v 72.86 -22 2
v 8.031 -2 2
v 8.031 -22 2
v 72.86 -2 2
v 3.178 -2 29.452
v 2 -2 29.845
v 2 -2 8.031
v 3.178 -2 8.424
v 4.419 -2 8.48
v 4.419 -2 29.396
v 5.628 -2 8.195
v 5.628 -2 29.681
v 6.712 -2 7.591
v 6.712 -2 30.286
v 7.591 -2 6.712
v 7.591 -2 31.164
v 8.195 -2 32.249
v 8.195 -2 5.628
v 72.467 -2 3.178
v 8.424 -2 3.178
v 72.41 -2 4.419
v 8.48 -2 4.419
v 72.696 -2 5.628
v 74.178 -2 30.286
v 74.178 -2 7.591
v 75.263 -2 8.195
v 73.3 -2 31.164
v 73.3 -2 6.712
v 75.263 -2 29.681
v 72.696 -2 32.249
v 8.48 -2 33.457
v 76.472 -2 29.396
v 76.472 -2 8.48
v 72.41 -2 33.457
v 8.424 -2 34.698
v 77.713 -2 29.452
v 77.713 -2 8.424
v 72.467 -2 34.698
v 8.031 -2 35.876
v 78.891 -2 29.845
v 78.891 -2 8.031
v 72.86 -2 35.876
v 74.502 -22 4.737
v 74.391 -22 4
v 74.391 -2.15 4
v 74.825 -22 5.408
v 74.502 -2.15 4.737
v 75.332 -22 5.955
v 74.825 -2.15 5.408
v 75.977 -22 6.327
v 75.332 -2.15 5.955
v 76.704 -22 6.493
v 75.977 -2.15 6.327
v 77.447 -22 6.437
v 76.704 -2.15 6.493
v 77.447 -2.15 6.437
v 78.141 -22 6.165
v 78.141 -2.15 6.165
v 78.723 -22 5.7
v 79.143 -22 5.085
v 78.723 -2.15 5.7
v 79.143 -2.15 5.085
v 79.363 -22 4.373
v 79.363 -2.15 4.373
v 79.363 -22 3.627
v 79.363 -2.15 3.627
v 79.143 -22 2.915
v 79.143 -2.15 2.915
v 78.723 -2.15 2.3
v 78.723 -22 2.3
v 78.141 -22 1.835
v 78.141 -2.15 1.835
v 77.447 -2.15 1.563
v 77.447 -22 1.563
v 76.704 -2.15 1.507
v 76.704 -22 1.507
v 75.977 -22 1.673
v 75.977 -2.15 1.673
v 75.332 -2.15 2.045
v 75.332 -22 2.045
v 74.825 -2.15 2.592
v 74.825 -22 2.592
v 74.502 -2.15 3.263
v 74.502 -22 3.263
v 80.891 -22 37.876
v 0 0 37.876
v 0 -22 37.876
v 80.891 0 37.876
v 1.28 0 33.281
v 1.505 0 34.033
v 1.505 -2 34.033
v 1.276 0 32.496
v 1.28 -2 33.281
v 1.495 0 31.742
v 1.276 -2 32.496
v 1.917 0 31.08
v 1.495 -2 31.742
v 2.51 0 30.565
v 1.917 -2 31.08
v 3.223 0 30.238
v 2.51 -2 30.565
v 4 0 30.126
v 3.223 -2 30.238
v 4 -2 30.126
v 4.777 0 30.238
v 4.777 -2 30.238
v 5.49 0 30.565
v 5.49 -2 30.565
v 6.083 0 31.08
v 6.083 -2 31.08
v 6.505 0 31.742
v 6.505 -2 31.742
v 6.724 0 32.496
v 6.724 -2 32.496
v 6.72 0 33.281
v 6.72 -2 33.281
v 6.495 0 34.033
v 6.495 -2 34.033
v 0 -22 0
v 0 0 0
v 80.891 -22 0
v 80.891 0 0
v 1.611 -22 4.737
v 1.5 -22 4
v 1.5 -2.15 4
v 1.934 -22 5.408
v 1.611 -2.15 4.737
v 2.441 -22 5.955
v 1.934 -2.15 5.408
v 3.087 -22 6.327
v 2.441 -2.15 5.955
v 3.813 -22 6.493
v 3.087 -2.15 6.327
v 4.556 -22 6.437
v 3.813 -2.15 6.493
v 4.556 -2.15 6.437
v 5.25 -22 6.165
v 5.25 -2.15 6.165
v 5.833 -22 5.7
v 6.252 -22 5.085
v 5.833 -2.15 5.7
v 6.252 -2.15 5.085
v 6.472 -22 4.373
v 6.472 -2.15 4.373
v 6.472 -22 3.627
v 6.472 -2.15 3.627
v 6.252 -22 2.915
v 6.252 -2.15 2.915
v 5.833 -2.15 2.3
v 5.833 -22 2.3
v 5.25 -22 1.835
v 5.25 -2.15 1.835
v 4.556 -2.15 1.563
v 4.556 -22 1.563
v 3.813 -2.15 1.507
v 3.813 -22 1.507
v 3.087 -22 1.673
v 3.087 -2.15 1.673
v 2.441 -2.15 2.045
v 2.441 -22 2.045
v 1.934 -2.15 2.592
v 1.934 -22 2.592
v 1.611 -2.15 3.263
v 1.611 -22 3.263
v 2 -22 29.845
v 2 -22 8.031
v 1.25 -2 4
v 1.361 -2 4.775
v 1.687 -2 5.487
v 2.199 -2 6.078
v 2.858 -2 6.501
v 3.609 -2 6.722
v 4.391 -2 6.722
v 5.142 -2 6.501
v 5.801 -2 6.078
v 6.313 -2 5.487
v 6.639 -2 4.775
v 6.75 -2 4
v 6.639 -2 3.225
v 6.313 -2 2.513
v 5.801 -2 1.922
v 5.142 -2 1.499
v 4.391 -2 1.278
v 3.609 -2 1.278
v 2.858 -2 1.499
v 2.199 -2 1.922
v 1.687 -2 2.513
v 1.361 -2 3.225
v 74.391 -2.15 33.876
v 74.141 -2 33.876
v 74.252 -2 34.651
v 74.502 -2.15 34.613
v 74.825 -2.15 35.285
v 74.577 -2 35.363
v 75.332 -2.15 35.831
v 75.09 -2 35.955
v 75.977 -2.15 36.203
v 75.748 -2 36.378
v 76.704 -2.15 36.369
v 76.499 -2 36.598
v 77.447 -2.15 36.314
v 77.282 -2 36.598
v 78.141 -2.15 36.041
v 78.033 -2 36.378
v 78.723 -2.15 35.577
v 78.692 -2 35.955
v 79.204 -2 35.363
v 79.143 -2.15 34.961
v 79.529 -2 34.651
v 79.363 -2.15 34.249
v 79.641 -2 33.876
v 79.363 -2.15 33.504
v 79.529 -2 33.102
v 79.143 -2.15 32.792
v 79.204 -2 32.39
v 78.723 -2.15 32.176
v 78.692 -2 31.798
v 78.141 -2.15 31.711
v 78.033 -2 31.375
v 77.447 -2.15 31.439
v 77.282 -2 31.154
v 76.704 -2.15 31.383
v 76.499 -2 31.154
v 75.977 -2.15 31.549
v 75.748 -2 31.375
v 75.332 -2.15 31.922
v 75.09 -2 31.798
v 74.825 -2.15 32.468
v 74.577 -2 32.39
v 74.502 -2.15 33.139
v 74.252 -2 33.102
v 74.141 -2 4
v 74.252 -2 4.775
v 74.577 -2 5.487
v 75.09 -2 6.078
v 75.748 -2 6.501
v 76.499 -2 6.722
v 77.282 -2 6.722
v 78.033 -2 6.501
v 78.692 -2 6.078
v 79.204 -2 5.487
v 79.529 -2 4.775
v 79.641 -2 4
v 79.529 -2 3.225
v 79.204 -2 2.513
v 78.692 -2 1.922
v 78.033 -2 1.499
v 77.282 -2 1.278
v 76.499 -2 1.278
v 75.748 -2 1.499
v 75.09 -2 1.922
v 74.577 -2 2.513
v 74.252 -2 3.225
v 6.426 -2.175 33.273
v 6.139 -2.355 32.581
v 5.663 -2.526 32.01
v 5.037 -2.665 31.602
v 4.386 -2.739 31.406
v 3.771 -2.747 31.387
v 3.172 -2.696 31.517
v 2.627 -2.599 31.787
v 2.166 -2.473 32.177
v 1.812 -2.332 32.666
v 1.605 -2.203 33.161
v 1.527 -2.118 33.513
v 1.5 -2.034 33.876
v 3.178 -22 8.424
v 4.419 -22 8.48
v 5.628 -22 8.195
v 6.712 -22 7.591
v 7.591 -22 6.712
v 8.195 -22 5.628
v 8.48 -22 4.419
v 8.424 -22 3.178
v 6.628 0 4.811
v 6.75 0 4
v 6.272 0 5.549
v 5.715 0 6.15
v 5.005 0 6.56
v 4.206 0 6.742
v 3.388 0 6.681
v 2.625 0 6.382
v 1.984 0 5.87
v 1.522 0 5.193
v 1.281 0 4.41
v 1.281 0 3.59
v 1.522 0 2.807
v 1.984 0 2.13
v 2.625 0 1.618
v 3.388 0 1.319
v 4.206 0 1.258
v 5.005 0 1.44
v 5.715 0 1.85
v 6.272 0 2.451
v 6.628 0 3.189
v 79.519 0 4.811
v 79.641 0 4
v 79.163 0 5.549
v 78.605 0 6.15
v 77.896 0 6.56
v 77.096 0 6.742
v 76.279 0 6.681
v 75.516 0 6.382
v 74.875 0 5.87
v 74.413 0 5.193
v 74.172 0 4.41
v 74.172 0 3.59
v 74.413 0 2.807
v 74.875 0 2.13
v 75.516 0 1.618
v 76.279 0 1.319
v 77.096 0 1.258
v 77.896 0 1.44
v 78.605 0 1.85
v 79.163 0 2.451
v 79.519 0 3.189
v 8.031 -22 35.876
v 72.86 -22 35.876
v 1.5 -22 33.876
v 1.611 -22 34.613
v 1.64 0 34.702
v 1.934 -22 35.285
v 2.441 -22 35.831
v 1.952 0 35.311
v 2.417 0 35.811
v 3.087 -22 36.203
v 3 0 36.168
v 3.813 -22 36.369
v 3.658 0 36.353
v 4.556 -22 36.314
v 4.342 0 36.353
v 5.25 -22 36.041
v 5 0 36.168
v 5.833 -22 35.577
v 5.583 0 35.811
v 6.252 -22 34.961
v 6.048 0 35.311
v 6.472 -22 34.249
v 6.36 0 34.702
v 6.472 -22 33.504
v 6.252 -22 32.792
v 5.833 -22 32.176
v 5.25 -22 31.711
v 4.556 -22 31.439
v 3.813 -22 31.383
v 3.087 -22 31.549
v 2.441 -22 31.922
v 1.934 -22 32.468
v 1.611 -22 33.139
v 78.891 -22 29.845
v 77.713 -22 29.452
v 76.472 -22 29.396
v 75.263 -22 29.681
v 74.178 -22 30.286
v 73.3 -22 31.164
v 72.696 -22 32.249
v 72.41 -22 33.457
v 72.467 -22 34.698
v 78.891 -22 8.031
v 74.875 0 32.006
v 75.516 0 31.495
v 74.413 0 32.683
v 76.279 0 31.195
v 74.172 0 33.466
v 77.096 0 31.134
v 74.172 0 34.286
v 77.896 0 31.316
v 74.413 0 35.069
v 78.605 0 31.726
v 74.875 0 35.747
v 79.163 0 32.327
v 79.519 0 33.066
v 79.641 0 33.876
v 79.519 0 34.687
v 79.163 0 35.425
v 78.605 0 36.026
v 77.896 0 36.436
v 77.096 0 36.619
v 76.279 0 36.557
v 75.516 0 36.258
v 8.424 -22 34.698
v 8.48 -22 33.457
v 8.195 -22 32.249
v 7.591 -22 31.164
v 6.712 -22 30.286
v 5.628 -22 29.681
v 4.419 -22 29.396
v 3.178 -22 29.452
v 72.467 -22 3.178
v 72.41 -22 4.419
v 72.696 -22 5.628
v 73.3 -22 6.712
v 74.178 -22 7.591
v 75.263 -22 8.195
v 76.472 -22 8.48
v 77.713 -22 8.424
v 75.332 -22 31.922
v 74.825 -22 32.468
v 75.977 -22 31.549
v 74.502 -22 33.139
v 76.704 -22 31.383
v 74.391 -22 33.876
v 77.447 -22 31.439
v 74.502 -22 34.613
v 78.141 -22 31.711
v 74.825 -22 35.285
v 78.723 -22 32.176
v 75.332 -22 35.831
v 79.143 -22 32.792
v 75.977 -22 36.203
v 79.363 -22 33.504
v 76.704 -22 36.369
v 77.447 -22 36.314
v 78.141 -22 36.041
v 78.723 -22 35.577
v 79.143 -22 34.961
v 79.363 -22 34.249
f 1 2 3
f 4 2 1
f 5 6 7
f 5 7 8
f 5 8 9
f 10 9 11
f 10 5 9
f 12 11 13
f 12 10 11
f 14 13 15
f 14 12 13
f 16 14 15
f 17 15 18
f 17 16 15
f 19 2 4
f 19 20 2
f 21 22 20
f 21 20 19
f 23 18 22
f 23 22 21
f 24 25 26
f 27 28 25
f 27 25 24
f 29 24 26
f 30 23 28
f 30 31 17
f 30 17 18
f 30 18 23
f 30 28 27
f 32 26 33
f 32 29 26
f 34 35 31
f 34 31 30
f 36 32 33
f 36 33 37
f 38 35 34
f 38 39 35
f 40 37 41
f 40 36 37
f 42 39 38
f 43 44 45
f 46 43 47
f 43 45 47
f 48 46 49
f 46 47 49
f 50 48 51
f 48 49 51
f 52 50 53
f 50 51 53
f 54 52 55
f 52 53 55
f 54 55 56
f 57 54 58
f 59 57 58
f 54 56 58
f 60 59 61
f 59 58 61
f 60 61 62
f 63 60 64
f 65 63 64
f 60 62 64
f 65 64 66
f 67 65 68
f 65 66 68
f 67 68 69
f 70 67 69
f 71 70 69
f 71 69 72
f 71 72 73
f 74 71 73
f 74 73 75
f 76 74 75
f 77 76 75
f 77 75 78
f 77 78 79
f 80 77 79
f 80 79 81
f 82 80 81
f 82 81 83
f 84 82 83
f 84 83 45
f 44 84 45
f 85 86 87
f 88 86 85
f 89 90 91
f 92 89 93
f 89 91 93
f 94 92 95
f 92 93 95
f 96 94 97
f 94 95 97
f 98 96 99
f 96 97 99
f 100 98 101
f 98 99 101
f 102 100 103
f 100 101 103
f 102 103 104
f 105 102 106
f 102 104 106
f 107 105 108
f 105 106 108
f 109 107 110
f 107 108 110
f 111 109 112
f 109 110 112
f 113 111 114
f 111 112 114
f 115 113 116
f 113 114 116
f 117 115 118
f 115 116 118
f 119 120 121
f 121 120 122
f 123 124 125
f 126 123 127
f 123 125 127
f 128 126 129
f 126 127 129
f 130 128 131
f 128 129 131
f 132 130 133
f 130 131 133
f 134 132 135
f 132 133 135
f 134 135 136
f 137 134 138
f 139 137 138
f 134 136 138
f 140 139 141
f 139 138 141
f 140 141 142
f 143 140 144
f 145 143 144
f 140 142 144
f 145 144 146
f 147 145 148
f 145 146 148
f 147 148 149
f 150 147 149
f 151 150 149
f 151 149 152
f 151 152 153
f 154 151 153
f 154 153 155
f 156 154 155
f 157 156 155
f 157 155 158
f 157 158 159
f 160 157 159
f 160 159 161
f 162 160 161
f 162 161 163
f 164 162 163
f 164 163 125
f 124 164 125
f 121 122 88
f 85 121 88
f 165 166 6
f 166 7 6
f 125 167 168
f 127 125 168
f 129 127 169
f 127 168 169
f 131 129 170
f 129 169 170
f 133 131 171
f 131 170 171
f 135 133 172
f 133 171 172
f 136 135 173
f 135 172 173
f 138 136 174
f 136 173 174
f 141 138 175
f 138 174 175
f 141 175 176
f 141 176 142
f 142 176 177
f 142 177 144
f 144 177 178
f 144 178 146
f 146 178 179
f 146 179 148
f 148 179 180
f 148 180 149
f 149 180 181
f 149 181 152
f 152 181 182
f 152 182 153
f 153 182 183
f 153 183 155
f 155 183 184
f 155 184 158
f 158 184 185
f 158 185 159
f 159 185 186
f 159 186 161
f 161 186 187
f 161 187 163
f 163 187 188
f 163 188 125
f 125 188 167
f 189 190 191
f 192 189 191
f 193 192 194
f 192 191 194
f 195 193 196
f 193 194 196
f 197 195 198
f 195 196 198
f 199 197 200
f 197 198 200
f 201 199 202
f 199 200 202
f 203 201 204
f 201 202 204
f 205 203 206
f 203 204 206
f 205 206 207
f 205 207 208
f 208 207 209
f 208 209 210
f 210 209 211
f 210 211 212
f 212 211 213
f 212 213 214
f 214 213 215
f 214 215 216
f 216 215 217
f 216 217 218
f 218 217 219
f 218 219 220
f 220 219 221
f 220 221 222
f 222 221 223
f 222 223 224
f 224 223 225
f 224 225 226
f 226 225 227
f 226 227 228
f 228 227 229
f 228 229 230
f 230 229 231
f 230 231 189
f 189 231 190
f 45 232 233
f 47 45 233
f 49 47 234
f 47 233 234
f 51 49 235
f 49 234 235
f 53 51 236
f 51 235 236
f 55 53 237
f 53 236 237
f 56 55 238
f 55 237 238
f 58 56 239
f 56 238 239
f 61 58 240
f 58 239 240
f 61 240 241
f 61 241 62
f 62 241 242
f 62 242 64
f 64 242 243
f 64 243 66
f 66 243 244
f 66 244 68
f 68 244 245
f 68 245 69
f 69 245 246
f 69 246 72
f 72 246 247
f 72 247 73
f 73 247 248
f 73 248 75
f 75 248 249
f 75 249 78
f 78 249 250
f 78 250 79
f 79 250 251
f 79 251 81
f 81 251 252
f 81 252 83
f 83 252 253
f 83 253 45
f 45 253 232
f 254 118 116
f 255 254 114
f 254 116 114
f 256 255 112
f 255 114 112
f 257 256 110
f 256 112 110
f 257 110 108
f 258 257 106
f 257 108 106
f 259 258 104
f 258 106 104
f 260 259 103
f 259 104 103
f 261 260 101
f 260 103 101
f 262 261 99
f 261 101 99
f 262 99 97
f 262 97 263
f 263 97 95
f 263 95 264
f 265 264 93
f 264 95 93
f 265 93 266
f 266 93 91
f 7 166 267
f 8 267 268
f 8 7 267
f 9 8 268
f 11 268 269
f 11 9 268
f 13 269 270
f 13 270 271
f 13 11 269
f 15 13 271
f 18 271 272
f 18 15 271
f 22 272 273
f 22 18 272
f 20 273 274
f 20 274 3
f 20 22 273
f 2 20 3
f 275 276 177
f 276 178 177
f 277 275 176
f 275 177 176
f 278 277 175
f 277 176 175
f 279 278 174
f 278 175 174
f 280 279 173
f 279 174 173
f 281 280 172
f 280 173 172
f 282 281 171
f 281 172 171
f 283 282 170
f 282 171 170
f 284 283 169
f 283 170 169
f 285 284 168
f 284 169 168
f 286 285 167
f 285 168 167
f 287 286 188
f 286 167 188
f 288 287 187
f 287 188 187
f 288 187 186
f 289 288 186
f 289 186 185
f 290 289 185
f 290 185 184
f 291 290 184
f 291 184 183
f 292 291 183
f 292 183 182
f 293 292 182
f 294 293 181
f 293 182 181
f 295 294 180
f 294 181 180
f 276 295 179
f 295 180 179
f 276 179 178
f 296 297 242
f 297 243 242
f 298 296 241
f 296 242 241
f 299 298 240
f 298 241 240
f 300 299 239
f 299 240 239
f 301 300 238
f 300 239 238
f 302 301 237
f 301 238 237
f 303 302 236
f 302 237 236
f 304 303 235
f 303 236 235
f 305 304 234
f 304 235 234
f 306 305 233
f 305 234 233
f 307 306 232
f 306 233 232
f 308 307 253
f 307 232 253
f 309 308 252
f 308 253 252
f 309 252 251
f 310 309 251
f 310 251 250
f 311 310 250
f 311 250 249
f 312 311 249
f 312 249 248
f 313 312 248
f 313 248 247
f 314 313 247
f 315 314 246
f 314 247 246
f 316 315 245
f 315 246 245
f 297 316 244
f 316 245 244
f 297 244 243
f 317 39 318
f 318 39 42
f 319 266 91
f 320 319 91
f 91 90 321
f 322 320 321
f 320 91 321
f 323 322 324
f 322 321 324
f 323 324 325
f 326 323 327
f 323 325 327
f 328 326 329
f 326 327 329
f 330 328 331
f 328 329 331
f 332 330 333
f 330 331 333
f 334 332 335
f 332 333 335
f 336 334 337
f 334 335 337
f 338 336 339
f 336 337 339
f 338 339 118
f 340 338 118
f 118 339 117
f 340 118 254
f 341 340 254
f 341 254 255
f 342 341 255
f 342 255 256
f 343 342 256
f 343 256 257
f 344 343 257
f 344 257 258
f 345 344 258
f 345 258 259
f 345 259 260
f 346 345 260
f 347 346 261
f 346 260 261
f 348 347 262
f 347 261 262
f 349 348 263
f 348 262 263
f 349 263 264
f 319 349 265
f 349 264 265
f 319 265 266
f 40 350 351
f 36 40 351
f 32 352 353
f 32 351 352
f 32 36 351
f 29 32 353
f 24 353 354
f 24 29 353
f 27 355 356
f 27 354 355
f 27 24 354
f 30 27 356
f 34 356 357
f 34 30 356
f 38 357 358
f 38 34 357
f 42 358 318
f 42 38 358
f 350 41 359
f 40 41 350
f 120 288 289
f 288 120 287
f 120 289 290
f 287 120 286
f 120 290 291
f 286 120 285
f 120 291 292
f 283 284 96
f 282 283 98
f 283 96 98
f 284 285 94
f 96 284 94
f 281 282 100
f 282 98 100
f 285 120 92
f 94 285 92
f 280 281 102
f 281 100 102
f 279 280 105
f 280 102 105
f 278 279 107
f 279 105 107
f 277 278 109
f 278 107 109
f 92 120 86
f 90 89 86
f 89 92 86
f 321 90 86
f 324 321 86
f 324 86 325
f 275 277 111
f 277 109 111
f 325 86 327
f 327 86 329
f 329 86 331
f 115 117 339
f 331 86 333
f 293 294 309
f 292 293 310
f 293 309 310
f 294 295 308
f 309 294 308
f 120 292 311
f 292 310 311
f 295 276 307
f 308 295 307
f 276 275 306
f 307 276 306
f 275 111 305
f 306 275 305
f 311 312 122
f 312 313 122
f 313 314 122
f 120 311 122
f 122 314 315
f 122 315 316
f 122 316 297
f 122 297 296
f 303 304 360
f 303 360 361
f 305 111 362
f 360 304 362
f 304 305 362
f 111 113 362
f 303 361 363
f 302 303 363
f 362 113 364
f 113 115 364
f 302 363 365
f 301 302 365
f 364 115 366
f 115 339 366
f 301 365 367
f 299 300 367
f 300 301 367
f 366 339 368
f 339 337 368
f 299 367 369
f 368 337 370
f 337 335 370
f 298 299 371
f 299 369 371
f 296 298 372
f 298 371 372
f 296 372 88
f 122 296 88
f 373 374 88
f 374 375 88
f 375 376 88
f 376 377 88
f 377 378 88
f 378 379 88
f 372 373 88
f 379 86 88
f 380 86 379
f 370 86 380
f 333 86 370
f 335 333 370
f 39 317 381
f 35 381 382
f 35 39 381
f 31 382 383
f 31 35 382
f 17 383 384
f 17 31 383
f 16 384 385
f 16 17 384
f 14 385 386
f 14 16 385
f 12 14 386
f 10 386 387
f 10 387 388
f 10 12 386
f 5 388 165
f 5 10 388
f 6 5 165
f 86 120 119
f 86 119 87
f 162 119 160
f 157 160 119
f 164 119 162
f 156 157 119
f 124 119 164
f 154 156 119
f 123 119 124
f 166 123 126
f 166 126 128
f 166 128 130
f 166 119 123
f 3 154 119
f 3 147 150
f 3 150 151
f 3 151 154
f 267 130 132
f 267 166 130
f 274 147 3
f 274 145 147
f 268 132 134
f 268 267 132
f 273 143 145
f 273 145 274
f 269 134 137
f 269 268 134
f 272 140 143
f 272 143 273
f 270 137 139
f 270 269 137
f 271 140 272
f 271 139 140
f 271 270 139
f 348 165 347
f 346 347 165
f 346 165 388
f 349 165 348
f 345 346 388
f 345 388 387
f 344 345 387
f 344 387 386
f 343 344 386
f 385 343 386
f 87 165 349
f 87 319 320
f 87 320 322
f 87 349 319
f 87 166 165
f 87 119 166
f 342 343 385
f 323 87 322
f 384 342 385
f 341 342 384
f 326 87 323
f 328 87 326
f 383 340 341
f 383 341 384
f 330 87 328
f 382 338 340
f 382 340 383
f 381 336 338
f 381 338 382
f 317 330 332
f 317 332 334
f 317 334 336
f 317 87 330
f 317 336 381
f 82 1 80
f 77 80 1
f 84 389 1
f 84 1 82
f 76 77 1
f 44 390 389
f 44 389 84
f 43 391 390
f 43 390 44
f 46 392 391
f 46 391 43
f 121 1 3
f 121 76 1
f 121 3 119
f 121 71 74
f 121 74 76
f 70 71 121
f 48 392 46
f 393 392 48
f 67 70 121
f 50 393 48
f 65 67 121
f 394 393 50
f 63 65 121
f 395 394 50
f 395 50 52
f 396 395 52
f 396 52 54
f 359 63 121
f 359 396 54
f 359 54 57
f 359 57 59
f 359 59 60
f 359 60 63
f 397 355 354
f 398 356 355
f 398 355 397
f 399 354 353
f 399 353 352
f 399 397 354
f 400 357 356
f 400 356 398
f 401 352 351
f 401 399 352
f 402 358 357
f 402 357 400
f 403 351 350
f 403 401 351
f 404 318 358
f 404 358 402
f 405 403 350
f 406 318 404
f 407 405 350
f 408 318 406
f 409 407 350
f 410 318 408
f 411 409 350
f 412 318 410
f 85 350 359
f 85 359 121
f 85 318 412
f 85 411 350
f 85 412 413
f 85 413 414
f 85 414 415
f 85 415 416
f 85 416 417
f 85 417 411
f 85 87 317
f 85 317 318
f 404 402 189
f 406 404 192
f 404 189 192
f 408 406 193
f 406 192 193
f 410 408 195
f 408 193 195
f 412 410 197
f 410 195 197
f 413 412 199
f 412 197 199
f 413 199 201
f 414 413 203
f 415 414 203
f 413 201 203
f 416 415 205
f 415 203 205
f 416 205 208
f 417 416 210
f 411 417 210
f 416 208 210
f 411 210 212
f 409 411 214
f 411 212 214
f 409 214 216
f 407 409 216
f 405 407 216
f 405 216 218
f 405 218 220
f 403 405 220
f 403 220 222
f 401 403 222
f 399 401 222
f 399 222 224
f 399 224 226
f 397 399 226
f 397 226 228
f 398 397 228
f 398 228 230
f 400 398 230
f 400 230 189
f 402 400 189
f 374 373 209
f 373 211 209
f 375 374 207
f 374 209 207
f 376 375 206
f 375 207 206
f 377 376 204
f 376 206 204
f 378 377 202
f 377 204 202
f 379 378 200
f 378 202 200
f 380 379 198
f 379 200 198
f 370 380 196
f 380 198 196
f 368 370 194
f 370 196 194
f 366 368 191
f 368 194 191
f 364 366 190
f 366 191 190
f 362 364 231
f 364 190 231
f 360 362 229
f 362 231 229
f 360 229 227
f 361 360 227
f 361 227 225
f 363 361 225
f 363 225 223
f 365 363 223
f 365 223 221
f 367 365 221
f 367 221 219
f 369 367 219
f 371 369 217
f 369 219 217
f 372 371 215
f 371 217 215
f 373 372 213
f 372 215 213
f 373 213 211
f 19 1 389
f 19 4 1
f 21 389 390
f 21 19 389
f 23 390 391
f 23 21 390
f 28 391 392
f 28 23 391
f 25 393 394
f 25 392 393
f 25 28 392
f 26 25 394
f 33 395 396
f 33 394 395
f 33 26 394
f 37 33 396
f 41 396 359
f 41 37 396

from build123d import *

# Parameters (mm, degrees)
F0_W     = 80.8908492327
F0_H     = 37.8762930632
F1_DEPTH = 22
F3_D     = 5
F3_DEPTH = 28
F3_TIP   = 1.5021515476
F4_T     = -2
F6_D     = 5.5
F6_DEPTH = 2
F6_TIP   = 1.6523667023


with BuildPart() as f1:
    # F0 (on Front) → F1 (new body)
    with BuildSketch(Plane.XZ):
        with Locations((40.4454246163, 18.9381465316)):
            Rectangle(F0_W, F0_H)
    extrude(amount=F1_DEPTH)

    # F3
    with Locations(Plane.XZ.offset(22)):
        with Locations((4, 33.8762930632), (4, 4), (76.8908492327, 4), (76.8908492327, 33.8762930632)):
            Hole(F3_D / 2, depth=F3_DEPTH)
            with Locations((0, 0, -(F3_DEPTH + F3_TIP / 2))):  # 118° drill point
                Cone(0, F3_D / 2, F3_TIP, mode=Mode.SUBTRACT)

    # F4
    f4_openings = [f1.faces().sort_by_distance(p)[0] for p in [
        (40.445425, -22, 18.938147),
    ]]
    offset(amount=F4_T, openings=f4_openings)

    # F6
    with Locations(Plane(origin=(0, 0, 0), x_dir=(-1, 0, 0), z_dir=(0, 1, 0))):
        with Locations((-76.8908492327, 33.8762930632), (-76.8908492327, 4), (-4, 4), (-4, 32.8762930632)):
            Hole(F6_D / 2, depth=F6_DEPTH)
            with Locations((0, 0, -(F6_DEPTH + F6_TIP / 2))):  # 118° drill point
                Cone(0, F6_D / 2, F6_TIP, mode=Mode.SUBTRACT)


solid = f1.part
